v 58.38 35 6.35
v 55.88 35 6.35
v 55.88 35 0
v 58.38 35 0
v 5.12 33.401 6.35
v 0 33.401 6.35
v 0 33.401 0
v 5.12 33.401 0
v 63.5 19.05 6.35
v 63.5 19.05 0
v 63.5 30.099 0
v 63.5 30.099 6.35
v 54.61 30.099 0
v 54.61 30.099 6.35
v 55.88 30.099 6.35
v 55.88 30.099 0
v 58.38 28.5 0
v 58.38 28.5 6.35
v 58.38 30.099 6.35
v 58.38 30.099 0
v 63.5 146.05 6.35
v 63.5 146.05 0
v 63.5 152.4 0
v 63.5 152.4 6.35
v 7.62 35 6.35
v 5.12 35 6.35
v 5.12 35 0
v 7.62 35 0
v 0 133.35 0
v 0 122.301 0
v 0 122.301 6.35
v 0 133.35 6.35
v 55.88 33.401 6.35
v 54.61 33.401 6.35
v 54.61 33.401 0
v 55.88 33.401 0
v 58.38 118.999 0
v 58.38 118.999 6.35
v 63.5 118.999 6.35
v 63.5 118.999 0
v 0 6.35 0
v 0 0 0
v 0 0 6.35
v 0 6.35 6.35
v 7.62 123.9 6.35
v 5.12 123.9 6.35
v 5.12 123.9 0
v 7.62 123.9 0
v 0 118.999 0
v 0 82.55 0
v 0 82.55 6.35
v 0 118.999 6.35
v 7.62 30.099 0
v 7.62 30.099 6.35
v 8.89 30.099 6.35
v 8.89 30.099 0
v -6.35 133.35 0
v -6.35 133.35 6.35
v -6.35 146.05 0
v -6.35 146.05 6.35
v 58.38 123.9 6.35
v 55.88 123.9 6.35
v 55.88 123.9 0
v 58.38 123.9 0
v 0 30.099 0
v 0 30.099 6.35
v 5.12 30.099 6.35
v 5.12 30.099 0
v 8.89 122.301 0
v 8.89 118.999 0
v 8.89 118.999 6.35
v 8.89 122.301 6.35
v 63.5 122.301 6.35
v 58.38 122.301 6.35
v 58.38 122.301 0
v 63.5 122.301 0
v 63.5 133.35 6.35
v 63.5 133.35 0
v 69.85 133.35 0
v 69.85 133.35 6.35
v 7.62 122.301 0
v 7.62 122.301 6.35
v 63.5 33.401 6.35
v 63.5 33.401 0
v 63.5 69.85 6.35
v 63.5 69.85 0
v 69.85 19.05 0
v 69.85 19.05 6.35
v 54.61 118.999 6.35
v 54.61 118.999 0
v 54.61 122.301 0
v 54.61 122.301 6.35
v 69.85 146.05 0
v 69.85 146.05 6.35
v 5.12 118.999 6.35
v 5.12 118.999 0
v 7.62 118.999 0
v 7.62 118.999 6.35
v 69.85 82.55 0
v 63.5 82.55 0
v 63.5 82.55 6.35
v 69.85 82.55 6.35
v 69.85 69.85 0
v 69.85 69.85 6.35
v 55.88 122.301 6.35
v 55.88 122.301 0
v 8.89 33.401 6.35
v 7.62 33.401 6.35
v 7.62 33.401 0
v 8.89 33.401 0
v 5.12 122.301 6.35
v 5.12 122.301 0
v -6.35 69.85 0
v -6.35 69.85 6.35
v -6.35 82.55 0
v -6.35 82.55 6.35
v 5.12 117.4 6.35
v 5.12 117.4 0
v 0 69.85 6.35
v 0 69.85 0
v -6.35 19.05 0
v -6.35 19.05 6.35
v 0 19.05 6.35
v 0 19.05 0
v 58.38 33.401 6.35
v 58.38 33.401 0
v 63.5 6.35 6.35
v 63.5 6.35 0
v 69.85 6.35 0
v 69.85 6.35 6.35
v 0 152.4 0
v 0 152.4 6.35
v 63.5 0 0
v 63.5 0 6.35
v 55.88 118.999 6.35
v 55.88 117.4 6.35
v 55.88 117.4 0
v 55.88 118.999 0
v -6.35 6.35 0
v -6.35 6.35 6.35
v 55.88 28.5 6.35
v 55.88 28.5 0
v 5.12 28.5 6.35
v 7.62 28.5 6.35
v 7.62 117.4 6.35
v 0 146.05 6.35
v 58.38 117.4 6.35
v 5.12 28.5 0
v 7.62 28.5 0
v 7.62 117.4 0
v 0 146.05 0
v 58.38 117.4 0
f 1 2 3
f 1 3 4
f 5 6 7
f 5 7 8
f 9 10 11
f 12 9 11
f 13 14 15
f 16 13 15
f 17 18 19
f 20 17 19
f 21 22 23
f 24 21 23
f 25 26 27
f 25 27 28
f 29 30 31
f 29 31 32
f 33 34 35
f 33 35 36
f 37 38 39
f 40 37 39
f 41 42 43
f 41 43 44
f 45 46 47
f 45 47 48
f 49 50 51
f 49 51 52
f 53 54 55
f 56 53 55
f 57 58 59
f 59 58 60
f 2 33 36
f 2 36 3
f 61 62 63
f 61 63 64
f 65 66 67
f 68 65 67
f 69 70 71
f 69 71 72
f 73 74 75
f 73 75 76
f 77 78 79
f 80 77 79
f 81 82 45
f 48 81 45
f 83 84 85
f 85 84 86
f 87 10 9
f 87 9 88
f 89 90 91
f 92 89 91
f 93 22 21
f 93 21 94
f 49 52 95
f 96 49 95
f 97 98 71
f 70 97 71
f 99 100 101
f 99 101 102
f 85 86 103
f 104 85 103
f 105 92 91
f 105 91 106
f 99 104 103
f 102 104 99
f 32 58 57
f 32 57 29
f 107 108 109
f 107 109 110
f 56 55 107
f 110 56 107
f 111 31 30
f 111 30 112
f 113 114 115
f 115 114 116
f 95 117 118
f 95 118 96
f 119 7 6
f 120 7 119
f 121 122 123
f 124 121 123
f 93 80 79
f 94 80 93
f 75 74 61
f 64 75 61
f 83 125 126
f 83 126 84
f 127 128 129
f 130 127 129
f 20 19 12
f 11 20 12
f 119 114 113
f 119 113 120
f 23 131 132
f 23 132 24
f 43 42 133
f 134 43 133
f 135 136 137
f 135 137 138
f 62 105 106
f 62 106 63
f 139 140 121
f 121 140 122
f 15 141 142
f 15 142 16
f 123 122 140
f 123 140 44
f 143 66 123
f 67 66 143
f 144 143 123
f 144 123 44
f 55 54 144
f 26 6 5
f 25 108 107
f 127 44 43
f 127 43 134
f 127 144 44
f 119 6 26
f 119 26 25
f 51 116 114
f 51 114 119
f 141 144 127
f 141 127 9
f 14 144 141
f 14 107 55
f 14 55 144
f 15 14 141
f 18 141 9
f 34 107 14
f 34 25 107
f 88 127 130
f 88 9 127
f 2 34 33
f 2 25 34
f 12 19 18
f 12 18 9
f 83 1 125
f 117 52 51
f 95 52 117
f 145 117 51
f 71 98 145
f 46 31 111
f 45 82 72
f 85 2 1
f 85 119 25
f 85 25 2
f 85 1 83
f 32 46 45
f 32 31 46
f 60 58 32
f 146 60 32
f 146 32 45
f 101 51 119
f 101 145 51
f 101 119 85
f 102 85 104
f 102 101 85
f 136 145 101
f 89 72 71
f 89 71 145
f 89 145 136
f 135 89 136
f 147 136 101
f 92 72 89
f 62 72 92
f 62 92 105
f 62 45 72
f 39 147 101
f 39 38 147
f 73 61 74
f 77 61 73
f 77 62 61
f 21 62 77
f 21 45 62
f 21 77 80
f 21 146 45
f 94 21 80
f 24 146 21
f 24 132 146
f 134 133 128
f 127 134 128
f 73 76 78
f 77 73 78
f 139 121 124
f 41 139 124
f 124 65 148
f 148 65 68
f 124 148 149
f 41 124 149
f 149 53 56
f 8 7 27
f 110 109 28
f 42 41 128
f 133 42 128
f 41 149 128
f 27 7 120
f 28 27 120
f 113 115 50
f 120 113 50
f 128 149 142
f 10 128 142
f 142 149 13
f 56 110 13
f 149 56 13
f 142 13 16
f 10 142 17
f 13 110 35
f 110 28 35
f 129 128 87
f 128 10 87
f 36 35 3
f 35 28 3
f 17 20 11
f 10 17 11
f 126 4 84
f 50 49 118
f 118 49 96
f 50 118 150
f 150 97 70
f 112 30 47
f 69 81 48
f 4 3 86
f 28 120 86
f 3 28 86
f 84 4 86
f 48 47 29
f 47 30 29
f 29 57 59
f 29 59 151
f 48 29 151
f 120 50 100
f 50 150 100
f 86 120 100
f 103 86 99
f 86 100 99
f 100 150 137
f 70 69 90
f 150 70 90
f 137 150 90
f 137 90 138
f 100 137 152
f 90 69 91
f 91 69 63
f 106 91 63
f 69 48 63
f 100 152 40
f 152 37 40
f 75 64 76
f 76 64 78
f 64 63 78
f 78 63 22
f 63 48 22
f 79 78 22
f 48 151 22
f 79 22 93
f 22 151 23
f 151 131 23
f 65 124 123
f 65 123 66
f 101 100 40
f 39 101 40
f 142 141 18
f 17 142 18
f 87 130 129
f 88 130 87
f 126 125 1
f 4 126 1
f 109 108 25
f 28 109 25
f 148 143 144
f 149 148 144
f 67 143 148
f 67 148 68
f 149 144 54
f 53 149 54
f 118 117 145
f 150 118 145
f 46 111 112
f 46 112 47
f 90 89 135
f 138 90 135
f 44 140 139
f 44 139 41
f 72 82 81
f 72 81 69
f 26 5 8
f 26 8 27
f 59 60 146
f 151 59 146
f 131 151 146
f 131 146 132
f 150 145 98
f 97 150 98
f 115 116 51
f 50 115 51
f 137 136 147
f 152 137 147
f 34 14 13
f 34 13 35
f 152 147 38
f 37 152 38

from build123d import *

# Parameters (mm, degrees)
SKETCH1_W           = 63.5
SKETCH1_H           = 152.4
BOSS_EXTRUDE1_DEPTH = 6.35
SKETCH2_W           = 6.35
SKETCH2_H           = 12.7
BOSS_EXTRUDE3_DEPTH = 6.35
SKETCH4_W           = 8.89
SKETCH4_H           = 3.302
SKETCH4_W_2         = 2.5
SKETCH4_H_2         = 6.5
CUT_EXTRUDE4_DEPTH  = 6.35


with BuildPart() as part:
    # Sketch1 → Boss-Extrude1 (new body)
    with BuildSketch(Plane.XY):
        with Locations((31.75, 76.2)):
            Rectangle(SKETCH1_W, SKETCH1_H)
    extrude(amount=BOSS_EXTRUDE1_DEPTH)

    # Sketch2 → Boss-Extrude3 (add)
    with BuildSketch(Plane.XY.offset(6.35)):
        with Locations((-3.175, 76.2)):
            Rectangle(SKETCH2_W, SKETCH2_H)
        with Locations((66.675, 139.7)):
            Rectangle(SKETCH2_W, SKETCH2_H)
        with Locations((66.675, 76.2)):
            Rectangle(SKETCH2_W, SKETCH2_H)
        with Locations((66.675, 12.7)):
            Rectangle(SKETCH2_W, SKETCH2_H)
        with Locations((-3.175, 12.7)):
            Rectangle(SKETCH2_W, SKETCH2_H)
        with Locations((-3.175, 139.7)):
            Rectangle(SKETCH2_W, SKETCH2_H)
    extrude(amount=-BOSS_EXTRUDE3_DEPTH)

    # Sketch4 → Cut-Extrude4 (cut)
    with BuildSketch(Plane.XY.offset(6.35)):
        with Locations((4.445, 120.65)):
            Rectangle(SKETCH4_W, SKETCH4_H)
        with Locations((6.37, 120.65)):
            Rectangle(SKETCH4_W_2, SKETCH4_H_2)
        with Locations((6.37, 31.75)):
            Rectangle(SKETCH4_W_2, SKETCH4_H_2)
        with Locations((4.445, 31.75)):
            Rectangle(SKETCH4_W, SKETCH4_H)
        with Locations((59.055, 31.75)):
            Rectangle(SKETCH4_W, SKETCH4_H)
        with Locations((57.13, 31.75)):
            Rectangle(SKETCH4_W_2, SKETCH4_H_2)
        with Locations((57.13, 120.65)):
            Rectangle(SKETCH4_W_2, SKETCH4_H_2)
        with Locations((59.055, 120.65)):
            Rectangle(SKETCH4_W, SKETCH4_H)
    extrude(amount=-CUT_EXTRUDE4_DEPTH, mode=Mode.SUBTRACT)


solid = part.part
